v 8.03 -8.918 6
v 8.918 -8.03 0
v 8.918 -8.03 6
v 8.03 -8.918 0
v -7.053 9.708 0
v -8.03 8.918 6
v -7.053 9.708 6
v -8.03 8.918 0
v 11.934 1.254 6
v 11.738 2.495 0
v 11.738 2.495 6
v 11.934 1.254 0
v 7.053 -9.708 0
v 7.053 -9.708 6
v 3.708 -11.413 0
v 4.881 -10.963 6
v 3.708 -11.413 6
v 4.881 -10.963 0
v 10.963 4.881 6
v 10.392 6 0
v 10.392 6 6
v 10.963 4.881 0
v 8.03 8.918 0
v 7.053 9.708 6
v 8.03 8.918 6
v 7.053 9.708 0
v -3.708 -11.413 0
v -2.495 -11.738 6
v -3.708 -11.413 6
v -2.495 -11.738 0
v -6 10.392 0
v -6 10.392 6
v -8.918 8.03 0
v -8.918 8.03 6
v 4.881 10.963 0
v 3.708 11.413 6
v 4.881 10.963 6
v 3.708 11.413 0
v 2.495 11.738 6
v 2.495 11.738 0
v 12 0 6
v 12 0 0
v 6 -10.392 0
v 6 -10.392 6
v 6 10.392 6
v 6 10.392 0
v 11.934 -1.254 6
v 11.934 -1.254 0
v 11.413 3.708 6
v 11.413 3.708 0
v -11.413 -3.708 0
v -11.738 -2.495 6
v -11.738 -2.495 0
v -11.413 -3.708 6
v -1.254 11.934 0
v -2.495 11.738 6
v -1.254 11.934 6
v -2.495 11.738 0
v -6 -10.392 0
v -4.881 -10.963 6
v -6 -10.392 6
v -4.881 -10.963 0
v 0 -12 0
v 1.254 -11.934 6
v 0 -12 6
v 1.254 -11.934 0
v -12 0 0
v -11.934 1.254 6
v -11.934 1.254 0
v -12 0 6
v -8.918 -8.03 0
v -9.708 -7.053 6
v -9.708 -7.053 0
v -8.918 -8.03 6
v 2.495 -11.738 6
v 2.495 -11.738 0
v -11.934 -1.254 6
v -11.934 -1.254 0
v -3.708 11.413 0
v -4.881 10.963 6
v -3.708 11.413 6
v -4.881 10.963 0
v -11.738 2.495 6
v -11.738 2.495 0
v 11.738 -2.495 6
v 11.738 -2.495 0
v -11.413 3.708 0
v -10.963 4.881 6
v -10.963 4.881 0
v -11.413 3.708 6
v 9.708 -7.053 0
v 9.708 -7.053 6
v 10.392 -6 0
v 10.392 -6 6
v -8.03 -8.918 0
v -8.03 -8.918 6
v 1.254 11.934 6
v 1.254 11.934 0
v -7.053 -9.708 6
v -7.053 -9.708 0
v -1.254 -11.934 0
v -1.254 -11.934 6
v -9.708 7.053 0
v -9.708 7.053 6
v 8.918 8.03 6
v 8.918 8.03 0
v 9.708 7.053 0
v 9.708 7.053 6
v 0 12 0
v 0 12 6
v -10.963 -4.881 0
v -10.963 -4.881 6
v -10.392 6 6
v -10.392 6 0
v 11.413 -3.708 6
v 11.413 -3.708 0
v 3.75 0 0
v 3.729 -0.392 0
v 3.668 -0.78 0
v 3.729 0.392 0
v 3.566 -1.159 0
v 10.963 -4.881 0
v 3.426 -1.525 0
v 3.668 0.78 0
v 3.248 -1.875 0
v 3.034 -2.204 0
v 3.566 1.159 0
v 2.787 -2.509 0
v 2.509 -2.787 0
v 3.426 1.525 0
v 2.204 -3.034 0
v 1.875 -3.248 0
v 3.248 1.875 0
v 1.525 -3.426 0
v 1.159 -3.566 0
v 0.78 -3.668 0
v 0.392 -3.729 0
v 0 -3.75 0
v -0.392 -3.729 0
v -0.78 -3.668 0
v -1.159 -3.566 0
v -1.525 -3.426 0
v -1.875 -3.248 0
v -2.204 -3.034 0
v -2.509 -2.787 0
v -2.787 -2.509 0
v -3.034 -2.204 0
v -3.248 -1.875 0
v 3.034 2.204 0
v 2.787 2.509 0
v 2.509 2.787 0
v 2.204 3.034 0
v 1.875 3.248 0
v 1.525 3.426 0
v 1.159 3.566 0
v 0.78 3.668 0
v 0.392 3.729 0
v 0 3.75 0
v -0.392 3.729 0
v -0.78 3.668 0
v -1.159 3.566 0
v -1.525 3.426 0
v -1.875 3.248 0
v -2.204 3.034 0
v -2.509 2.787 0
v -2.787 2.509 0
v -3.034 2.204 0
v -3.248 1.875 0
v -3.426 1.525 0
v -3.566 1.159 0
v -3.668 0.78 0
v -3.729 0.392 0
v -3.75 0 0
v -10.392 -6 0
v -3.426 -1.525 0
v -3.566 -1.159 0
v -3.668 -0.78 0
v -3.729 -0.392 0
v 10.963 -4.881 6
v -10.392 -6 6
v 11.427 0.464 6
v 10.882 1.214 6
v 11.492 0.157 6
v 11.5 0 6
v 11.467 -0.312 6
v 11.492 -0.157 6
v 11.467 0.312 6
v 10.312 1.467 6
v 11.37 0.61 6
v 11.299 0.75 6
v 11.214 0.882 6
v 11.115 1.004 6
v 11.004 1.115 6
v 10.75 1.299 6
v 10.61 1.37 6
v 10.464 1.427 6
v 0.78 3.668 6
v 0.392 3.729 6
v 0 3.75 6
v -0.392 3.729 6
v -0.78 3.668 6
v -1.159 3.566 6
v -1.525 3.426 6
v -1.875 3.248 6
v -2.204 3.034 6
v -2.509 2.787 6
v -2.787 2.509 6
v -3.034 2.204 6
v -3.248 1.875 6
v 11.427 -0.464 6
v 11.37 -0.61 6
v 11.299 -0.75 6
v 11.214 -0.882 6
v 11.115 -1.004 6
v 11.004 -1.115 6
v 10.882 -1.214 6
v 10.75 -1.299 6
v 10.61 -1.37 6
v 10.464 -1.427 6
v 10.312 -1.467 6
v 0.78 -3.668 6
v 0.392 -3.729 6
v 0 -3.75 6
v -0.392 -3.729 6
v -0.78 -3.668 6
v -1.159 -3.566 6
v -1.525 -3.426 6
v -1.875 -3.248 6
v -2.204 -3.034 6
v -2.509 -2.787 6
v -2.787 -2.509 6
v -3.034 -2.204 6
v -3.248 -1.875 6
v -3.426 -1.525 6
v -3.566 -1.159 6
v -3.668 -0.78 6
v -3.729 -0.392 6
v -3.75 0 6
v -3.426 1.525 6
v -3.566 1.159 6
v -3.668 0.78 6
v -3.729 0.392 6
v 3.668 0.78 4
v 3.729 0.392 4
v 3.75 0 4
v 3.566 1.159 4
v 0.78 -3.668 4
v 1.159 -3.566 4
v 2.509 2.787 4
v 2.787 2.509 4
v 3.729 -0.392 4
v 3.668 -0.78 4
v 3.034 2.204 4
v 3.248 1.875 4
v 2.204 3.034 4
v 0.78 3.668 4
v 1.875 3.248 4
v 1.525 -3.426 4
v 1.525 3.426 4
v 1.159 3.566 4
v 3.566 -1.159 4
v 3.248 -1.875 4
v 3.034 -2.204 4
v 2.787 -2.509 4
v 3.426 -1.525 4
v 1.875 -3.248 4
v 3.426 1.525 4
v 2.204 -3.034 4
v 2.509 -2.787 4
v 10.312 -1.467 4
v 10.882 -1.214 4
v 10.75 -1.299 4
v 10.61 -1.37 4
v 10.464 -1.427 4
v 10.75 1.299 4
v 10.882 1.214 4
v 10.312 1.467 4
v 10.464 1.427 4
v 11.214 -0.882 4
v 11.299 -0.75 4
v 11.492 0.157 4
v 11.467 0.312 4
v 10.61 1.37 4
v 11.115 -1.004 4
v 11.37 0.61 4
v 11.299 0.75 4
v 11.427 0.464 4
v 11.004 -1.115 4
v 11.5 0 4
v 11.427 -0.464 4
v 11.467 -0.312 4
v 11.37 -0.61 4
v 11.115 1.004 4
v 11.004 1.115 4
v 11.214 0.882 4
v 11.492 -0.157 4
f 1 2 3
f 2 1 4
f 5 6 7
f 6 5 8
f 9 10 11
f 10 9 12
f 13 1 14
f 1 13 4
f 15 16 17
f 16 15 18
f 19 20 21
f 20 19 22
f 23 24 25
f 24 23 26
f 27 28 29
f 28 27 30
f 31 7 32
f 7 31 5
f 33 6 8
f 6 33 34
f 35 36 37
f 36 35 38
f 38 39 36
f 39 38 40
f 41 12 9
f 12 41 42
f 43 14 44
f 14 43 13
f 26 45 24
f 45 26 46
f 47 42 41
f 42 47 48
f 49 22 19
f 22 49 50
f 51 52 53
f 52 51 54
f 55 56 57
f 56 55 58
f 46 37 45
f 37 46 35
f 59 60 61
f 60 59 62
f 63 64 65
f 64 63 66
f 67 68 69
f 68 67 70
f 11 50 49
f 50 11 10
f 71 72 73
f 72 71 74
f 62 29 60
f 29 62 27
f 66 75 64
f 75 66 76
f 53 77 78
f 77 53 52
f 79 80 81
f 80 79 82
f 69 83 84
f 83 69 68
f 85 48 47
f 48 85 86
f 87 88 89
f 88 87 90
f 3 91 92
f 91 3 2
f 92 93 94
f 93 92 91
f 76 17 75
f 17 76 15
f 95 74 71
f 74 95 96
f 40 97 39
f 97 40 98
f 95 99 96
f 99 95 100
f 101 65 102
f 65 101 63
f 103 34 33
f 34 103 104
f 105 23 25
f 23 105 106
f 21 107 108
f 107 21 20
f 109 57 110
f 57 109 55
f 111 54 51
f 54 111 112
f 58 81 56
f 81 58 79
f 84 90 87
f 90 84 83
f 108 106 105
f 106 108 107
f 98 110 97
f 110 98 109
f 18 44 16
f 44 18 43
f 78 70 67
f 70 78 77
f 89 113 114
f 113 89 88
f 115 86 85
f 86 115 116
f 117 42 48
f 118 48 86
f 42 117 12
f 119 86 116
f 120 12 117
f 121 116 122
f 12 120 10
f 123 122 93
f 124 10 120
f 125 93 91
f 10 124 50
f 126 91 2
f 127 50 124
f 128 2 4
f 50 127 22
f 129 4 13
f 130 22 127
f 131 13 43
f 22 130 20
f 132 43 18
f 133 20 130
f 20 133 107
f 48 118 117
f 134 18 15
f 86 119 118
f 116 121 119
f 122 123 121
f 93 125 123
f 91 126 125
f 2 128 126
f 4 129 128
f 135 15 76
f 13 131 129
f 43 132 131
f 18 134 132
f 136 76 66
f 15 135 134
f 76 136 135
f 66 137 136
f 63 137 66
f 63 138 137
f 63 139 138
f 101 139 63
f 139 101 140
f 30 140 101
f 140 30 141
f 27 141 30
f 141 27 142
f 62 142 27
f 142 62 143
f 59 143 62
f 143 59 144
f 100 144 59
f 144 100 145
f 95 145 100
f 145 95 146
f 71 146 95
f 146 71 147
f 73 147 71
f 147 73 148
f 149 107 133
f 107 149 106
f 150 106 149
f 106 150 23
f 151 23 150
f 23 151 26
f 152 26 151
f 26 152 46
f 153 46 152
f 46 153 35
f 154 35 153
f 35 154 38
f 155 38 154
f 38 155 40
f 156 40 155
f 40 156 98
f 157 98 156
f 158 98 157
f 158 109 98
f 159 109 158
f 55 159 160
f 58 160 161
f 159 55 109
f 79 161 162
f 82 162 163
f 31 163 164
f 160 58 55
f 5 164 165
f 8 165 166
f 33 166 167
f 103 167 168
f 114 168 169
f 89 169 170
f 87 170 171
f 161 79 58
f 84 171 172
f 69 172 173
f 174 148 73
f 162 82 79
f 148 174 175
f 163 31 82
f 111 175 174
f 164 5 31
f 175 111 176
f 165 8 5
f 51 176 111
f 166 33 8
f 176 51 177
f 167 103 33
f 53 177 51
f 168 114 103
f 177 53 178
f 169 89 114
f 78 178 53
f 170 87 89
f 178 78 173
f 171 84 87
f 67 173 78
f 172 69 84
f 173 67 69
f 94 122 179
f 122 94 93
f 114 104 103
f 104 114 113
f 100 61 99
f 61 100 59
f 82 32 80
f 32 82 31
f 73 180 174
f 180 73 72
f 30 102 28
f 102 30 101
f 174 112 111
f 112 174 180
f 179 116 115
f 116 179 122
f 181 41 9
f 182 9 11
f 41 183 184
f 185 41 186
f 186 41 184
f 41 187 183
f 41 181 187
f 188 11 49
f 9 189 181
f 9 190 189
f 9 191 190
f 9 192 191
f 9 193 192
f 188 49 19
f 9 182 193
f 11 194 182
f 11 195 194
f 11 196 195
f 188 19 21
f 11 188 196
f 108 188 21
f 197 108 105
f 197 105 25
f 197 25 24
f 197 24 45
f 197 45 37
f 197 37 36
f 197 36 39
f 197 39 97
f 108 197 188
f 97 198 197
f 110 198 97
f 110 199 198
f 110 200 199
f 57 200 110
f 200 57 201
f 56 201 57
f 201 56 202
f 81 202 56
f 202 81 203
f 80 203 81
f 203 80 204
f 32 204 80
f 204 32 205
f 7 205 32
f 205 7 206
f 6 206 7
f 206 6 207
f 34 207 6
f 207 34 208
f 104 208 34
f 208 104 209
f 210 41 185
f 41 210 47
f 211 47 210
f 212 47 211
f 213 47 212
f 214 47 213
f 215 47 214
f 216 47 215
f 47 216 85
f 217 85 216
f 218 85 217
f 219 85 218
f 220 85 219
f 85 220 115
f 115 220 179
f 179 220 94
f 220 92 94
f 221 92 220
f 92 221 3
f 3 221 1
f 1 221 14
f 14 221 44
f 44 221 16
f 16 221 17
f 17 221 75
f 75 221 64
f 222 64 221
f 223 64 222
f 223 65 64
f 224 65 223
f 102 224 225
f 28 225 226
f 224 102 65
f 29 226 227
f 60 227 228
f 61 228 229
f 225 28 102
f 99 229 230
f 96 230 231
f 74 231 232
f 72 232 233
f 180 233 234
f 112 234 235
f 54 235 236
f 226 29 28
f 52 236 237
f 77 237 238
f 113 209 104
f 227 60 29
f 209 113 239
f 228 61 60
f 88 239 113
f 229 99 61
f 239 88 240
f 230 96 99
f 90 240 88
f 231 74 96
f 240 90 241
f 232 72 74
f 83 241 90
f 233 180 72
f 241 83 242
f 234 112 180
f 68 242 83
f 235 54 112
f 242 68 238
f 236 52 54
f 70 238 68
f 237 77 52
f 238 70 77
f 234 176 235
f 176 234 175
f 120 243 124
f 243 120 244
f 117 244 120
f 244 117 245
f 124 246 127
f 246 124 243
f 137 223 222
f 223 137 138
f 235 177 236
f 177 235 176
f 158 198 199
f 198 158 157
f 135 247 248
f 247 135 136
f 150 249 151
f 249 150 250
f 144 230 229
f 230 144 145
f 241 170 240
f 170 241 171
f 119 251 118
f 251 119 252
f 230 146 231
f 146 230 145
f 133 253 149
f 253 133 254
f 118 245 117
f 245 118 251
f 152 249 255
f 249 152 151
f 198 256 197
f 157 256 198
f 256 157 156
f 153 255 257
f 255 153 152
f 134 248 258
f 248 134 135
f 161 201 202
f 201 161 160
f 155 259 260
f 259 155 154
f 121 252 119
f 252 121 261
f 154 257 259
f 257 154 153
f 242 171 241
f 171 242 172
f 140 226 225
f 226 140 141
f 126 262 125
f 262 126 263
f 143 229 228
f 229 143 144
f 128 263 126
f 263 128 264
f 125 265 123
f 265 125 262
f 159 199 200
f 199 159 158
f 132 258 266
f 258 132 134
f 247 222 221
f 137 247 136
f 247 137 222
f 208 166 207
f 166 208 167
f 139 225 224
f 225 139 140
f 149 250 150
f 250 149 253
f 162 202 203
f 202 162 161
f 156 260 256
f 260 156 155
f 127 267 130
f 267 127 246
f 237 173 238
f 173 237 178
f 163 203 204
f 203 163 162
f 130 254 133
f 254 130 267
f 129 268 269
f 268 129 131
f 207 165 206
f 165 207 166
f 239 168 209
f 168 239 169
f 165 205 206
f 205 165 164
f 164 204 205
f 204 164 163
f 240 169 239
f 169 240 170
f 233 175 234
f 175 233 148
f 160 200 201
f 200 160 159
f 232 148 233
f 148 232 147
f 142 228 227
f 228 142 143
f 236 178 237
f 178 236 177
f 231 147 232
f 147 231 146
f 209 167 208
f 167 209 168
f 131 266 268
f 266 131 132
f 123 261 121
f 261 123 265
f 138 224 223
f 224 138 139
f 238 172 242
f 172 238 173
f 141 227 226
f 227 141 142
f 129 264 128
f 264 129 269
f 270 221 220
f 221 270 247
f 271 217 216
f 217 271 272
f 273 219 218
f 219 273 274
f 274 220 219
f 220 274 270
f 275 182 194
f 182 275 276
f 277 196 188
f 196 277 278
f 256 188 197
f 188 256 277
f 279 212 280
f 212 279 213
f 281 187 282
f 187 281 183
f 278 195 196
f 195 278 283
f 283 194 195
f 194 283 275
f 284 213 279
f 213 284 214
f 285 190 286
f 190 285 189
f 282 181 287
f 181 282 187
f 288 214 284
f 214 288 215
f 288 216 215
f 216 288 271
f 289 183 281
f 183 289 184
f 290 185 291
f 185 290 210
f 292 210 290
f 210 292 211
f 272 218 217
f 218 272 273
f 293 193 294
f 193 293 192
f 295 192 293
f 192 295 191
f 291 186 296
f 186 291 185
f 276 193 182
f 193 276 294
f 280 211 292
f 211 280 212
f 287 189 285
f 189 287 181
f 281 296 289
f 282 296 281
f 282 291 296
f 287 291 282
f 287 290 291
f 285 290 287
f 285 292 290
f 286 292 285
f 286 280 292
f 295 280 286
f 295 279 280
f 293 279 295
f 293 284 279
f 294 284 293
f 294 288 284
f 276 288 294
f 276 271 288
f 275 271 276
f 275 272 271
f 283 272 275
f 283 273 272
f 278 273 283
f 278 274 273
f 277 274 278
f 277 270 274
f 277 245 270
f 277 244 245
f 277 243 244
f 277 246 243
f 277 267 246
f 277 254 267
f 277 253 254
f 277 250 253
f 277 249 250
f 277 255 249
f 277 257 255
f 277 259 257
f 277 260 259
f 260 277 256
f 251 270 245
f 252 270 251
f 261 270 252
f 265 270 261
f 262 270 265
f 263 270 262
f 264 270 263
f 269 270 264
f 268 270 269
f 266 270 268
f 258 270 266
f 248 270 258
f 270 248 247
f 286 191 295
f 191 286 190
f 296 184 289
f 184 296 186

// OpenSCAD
$fn=60;
difference(){
cylinder(d=24,h=6);
translate([0,0,-1])cylinder(d=7.5,h=9);
translate([0,0,4])
hull(){
  cylinder(d=7.5,h=9);
  translate([10,0,0])cylinder(d=3,h=9);
}  
}
